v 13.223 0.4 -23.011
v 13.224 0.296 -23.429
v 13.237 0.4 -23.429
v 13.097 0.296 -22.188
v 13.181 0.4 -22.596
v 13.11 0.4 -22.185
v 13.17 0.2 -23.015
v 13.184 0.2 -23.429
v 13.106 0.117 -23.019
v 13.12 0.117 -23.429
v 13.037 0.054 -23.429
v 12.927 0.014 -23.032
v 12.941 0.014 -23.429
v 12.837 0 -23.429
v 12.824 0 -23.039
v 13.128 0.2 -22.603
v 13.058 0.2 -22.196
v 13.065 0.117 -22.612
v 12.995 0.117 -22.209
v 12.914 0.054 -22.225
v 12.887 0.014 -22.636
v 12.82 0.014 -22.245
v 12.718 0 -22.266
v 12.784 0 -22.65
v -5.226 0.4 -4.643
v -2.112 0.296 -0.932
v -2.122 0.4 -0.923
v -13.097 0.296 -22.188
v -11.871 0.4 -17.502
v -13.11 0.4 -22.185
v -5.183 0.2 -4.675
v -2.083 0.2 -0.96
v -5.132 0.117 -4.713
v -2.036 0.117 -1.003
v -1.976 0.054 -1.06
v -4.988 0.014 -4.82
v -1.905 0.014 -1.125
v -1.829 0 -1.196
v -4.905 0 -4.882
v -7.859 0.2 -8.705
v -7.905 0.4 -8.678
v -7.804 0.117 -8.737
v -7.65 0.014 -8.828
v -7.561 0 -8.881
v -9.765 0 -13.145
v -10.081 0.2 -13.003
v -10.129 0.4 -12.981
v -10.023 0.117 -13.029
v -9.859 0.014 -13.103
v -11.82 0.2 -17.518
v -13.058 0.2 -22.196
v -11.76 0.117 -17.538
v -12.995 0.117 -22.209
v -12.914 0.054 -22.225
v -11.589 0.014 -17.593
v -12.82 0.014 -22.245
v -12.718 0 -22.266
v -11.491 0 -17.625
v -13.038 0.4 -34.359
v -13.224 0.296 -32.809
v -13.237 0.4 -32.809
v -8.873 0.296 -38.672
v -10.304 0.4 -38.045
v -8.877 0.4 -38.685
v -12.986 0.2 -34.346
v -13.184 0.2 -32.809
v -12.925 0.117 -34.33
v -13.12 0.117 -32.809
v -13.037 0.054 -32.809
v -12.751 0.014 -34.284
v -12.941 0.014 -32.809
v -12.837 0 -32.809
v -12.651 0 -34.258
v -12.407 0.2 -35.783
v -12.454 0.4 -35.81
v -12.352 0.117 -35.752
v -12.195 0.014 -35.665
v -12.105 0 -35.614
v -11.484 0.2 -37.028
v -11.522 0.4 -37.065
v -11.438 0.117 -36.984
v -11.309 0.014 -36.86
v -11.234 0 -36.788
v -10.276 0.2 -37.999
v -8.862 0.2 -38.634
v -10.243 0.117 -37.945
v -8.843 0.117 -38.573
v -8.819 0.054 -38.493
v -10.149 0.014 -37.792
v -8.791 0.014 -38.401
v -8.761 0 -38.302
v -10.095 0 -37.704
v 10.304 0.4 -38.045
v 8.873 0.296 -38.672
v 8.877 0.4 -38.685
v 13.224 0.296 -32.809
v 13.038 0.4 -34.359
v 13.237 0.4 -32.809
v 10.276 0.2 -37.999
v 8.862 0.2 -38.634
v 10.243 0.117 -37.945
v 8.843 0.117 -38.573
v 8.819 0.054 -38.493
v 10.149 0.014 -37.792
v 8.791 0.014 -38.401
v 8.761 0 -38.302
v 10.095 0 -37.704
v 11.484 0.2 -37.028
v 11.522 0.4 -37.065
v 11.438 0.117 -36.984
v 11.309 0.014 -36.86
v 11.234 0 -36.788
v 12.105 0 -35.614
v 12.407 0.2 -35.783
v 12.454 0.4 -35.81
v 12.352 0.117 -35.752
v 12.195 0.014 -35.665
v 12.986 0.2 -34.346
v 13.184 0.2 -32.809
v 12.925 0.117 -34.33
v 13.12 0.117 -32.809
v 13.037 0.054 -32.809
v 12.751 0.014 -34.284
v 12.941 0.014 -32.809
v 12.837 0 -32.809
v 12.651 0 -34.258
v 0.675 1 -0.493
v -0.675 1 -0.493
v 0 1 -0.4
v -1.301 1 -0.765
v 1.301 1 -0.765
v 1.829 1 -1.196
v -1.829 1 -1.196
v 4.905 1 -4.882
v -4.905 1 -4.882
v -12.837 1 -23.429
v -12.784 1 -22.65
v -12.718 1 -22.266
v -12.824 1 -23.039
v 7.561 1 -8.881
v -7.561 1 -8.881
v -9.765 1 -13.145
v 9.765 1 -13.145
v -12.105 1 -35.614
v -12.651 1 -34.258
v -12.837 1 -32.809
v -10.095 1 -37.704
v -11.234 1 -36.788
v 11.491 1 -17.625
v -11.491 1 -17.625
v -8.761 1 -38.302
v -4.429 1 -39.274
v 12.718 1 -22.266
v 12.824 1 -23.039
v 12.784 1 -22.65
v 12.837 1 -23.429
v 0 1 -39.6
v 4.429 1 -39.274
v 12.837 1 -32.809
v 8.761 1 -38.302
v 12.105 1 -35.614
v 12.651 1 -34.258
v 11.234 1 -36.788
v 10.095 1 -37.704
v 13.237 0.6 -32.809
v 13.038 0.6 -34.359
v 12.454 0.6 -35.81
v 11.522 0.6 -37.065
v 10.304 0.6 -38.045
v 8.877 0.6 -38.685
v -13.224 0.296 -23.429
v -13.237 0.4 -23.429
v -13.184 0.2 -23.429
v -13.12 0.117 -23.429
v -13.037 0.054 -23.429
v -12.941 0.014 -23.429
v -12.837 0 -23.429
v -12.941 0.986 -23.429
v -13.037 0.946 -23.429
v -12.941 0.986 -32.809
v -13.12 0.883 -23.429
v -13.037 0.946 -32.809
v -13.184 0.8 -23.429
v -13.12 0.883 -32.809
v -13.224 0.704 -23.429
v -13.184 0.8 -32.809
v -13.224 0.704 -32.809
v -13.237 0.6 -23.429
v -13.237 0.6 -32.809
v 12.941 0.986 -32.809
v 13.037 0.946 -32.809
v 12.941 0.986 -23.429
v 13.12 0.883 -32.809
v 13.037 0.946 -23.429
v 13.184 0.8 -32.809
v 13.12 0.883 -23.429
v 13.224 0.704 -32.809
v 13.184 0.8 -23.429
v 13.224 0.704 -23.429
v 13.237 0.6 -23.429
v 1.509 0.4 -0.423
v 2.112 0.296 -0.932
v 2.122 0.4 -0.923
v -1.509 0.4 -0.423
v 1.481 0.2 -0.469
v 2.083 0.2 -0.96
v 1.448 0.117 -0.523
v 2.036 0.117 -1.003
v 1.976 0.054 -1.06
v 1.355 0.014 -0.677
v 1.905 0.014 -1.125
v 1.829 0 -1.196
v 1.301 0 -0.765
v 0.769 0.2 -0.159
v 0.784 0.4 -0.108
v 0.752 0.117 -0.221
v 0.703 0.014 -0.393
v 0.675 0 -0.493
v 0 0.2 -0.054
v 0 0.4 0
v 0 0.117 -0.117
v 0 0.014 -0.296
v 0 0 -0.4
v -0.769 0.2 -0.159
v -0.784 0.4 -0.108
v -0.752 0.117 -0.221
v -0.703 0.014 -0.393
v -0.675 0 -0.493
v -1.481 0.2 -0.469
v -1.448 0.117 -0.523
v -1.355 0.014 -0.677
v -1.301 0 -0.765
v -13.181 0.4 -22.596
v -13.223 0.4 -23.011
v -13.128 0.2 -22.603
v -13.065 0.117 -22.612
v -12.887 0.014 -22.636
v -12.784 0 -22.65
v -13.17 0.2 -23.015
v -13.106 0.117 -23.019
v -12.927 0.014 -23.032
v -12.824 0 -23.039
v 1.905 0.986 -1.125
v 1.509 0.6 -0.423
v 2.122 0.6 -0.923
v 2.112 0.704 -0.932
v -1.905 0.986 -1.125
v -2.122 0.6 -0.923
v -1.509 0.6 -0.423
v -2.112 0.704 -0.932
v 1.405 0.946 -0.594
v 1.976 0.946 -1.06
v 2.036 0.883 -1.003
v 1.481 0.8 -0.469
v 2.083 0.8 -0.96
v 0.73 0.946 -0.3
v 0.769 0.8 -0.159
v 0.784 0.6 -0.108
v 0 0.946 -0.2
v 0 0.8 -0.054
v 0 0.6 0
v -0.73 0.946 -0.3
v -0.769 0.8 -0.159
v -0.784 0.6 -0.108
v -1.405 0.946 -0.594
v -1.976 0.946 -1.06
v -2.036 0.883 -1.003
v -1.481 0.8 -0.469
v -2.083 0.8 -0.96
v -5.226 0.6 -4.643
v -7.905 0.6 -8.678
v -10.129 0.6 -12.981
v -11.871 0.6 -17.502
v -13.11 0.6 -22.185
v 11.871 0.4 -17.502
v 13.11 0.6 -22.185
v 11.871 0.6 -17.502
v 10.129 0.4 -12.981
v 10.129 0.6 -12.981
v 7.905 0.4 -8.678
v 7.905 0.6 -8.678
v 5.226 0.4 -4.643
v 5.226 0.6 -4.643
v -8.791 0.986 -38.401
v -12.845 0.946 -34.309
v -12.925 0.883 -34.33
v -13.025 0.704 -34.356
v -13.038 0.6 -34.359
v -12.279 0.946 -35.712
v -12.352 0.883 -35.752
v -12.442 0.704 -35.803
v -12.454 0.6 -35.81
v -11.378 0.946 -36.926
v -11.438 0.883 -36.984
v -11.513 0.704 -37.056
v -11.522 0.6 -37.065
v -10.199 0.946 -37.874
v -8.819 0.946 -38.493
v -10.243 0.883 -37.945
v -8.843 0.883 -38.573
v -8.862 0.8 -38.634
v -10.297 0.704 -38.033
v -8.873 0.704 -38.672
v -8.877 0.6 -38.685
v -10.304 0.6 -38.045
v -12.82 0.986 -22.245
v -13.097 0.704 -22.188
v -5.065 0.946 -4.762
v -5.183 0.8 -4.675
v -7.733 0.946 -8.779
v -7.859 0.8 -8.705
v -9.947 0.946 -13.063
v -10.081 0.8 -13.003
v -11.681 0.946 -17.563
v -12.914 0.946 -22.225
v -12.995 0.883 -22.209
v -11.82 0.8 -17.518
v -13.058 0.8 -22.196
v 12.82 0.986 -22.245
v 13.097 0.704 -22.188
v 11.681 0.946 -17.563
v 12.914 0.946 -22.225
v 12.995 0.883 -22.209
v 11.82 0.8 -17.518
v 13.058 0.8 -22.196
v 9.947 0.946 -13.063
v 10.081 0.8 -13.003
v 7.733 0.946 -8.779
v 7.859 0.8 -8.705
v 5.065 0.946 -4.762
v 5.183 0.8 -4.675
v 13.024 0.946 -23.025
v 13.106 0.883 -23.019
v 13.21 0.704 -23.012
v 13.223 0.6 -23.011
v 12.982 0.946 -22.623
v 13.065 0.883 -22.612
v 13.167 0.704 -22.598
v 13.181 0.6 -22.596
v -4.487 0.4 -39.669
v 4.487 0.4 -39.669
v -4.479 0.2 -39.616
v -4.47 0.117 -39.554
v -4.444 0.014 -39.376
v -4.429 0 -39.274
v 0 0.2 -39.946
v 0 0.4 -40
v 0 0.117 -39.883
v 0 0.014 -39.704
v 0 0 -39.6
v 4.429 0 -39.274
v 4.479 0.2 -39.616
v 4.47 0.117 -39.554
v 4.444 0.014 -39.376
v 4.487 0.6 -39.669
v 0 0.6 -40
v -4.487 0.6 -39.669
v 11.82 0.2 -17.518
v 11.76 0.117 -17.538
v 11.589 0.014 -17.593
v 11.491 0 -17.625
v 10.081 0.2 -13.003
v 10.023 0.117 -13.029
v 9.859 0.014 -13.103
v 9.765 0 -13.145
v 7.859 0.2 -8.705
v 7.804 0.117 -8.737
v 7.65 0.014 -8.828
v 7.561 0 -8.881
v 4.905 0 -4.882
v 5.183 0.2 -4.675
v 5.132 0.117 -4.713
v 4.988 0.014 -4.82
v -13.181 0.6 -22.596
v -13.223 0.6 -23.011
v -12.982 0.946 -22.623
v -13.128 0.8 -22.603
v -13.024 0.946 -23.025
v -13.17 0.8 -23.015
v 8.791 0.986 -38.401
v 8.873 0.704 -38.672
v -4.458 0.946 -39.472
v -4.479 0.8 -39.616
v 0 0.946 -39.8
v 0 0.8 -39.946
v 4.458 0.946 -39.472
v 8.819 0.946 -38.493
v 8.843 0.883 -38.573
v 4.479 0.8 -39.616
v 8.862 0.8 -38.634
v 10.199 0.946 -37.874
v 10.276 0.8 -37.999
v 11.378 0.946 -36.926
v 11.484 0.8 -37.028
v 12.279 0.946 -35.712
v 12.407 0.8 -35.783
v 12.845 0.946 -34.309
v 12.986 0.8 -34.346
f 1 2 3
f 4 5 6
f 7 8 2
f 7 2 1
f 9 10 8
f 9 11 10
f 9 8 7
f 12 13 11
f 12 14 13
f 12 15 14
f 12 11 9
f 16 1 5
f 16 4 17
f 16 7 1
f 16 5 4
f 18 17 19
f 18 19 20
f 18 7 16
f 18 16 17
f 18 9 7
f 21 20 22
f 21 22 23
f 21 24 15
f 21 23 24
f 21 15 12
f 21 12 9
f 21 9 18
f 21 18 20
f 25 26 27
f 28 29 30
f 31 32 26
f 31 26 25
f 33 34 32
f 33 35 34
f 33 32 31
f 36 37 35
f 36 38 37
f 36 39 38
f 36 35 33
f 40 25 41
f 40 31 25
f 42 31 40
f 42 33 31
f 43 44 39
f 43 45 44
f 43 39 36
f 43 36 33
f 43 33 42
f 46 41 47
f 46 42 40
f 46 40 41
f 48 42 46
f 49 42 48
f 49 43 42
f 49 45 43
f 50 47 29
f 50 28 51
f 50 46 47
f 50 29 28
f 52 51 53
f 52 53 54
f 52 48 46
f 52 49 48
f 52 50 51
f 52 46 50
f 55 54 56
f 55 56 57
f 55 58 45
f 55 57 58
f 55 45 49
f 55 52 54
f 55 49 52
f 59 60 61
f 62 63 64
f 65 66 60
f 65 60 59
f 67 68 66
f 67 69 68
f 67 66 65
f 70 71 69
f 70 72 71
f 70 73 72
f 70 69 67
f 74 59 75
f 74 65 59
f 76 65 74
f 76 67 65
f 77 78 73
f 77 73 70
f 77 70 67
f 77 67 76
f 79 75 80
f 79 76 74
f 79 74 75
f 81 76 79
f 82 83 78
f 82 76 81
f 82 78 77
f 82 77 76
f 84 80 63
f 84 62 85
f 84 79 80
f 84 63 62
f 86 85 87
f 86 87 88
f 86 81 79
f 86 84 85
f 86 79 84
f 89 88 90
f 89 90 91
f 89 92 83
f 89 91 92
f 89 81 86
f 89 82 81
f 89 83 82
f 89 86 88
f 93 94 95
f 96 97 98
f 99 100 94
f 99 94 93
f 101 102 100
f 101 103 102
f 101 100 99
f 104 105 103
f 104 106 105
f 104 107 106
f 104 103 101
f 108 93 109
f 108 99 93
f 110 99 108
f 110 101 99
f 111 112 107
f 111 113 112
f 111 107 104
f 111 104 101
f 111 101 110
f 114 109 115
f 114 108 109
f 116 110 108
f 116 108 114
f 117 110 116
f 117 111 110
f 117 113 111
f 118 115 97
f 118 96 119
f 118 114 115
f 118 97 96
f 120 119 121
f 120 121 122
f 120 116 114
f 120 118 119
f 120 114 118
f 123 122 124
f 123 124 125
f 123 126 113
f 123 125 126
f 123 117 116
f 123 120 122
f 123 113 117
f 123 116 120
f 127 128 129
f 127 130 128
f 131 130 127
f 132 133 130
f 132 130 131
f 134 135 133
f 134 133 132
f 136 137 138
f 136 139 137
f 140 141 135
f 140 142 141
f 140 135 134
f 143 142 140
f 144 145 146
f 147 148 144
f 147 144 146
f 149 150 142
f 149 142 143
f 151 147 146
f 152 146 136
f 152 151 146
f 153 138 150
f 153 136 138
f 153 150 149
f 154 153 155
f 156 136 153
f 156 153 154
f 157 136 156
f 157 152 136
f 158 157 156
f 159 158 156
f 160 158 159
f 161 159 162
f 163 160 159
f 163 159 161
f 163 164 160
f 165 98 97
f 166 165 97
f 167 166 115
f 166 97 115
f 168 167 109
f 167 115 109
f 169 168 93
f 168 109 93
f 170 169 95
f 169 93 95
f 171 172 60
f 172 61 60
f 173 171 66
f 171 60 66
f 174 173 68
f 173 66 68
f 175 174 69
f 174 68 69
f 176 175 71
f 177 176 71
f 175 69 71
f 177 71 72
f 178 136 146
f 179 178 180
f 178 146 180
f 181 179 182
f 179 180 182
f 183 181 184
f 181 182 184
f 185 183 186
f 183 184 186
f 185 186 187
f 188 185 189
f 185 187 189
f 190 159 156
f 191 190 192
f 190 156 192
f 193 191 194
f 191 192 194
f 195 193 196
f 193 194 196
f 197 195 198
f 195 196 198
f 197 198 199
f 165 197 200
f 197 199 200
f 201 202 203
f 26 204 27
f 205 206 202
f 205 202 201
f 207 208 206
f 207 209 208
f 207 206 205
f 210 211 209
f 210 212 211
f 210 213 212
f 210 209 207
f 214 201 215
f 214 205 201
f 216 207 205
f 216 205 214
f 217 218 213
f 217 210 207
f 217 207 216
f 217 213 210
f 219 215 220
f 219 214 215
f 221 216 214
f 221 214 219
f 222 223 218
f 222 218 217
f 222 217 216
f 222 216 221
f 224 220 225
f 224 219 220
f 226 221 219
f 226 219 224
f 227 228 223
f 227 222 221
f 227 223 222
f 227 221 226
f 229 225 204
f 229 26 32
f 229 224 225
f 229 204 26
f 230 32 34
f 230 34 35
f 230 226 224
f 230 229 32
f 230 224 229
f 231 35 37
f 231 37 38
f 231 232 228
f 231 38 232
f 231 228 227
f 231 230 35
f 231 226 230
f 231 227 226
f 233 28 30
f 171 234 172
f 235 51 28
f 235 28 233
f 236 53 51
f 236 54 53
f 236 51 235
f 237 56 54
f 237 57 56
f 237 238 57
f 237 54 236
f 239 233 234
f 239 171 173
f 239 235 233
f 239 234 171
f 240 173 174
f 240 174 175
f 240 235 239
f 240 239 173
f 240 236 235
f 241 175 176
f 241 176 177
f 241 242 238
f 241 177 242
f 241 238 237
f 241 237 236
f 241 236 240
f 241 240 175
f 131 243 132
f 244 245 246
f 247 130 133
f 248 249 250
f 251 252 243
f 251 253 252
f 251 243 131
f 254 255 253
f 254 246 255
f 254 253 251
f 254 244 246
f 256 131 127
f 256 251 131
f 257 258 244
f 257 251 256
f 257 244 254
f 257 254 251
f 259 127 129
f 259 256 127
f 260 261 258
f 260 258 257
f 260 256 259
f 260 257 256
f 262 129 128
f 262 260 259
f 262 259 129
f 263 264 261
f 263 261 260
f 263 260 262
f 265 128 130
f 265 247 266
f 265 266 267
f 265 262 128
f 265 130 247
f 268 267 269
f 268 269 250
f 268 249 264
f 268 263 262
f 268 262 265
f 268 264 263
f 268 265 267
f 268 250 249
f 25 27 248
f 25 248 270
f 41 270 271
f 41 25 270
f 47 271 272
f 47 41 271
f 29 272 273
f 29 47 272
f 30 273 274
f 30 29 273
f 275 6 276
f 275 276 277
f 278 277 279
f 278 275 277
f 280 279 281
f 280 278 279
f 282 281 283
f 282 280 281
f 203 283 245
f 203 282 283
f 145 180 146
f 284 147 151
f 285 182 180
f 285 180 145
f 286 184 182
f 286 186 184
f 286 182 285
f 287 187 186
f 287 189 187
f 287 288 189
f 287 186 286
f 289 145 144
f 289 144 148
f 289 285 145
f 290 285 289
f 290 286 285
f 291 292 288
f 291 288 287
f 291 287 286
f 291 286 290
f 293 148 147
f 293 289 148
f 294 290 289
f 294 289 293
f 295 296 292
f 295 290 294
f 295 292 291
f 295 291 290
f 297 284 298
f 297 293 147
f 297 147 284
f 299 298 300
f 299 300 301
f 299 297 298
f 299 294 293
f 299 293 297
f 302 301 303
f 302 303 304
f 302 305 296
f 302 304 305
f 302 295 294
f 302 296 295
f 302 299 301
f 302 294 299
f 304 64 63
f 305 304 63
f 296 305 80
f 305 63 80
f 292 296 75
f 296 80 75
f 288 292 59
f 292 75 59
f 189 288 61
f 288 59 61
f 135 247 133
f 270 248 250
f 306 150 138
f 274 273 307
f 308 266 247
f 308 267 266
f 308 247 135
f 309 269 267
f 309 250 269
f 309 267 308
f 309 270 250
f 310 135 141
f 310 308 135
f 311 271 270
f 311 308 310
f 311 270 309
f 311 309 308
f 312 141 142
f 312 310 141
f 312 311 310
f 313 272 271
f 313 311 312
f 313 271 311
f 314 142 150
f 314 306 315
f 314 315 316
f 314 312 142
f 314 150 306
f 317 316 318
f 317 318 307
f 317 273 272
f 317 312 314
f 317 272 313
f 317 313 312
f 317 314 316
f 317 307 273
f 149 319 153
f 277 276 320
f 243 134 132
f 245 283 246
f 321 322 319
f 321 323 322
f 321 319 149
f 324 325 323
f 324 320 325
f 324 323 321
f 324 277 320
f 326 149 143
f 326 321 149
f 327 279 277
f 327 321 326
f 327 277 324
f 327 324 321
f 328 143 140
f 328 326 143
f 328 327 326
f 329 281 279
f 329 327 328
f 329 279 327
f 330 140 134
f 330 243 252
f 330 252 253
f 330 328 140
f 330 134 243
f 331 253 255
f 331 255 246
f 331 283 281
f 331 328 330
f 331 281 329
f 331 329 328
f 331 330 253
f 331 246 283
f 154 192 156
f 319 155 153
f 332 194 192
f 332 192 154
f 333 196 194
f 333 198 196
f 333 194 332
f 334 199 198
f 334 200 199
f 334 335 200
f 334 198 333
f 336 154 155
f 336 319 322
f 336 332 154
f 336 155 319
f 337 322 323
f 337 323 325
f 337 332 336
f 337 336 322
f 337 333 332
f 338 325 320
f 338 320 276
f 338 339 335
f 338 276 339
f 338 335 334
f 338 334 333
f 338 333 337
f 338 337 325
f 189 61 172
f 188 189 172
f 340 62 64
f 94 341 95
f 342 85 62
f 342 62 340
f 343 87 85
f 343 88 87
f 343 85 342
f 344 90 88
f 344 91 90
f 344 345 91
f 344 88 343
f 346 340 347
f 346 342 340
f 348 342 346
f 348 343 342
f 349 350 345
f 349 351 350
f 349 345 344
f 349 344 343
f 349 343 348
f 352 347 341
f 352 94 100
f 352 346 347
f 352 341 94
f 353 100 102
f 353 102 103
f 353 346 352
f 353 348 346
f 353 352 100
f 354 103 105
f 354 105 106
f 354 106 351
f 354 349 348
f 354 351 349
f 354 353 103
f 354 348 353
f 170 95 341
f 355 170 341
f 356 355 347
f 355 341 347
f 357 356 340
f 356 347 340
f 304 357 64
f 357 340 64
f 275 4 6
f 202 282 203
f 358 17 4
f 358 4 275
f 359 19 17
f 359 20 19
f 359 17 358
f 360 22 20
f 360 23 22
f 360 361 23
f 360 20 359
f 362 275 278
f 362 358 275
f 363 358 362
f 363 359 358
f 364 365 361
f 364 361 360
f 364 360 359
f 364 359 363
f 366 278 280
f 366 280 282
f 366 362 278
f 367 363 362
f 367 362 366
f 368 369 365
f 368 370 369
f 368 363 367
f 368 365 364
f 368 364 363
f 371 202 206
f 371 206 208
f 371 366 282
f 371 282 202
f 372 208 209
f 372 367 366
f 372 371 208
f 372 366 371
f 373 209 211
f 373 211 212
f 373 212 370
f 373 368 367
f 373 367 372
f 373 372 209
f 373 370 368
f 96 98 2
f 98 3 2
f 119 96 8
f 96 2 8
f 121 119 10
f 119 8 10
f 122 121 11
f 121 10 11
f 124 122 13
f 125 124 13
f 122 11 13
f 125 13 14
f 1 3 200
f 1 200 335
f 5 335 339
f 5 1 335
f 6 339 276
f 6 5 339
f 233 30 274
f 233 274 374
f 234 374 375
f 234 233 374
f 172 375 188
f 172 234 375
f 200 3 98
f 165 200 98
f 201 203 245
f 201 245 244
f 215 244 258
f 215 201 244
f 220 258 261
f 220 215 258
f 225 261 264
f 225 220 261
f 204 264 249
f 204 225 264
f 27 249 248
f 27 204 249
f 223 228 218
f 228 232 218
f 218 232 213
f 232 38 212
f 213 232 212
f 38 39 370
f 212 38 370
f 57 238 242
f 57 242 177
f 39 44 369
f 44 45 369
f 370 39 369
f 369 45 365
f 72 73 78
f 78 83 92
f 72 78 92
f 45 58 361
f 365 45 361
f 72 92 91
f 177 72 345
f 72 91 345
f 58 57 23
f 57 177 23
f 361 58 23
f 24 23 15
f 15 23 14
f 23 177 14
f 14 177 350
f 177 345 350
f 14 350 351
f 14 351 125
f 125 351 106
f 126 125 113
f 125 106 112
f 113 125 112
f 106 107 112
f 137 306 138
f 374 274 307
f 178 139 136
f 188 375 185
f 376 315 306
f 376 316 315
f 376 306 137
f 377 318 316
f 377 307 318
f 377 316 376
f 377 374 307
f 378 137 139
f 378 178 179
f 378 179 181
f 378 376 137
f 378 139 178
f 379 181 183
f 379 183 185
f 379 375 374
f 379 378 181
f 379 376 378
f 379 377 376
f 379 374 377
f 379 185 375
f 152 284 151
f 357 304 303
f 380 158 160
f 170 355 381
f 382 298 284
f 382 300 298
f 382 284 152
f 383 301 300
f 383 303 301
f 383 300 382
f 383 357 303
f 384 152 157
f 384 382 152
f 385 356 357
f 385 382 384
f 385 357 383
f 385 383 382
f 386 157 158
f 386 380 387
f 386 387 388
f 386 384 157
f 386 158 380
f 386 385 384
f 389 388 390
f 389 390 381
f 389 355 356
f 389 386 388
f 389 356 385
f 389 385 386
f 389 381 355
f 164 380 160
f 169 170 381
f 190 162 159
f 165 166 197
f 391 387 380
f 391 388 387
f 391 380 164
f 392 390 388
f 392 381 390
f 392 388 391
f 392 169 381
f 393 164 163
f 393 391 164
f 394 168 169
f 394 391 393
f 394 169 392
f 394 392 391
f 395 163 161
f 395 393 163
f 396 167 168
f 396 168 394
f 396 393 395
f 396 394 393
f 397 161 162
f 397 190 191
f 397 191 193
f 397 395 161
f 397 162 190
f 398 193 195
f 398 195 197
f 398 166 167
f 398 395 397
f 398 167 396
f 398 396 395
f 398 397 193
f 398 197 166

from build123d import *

# Parameters (mm, degrees)
BOSS_EXTRUDE1_DEPTH = 1
BOSS_EXTRUDE2_DEPTH = 1
FILLET1_R           = 0.4


with BuildPart() as part:
    # Sketch1 → Boss-Extrude1 (new body)
    with BuildSketch(Plane(origin=(0, 0, 0), x_dir=(1, 0, 0), z_dir=(0, 1, 0))):
        with BuildLine():
            ThreePointArc((-8.877423872, 29.304875795), (0, 30.62), (8.877423872, 29.304875795))
            ThreePointArc((8.877423872, 29.304875795), (12.375173273, 26.566048159), (13.11, 22.184786084))
            ThreePointArc((13.11, 22.184786084), (9.076207285, 10.799312083), (2.121856975, 0.92320386))
            ThreePointArc((2.121856975, 0.92320386), (0, 0), (-2.121856975, 0.92320386))
            ThreePointArc((-2.121856975, 0.92320386), (-9.076207285, 10.799312083), (-13.11, 22.184786084))
            ThreePointArc((-13.11, 22.184786084), (-12.375173273, 26.566048159), (-8.877423872, 29.304875795))
        make_face()
    extrude(amount=BOSS_EXTRUDE1_DEPTH)

    # Sketch2 → Boss-Extrude2 (add)
    with BuildSketch(Plane(origin=(0, 0, 0), x_dir=(1, 0, 0), z_dir=(0, 1, 0))):
        with BuildLine():
            Line((-13.23730034, 32.808587834), (-13.23730034, 23.428587834))
            Line((-13.23730034, 23.428587834), (13.23730034, 23.428587834))
            Line((13.23730034, 23.428587834), (13.23730034, 32.808587834))
            ThreePointArc((13.23730034, 32.808587834), (12.02830219, 36.467114963), (8.877423872, 38.684875795))
            ThreePointArc((8.877423872, 38.684875795), (0, 40), (-8.877423872, 38.684875795))
            ThreePointArc((-8.877423872, 38.684875795), (-12.02830219, 36.467114963), (-13.23730034, 32.808587834))
        make_face()
    extrude(amount=BOSS_EXTRUDE2_DEPTH)

    # Fillet1
    fillet1_edges = [part.edges().sort_by_distance(p)[0] for p in [
        (0, 1, 0),
        (9.076207285, 1, -10.799312083),
        (-13.205392346, 0, -22.803438218),
        (-13.205392346, 1, -22.803438218),
        (13.205392346, 1, -22.803438218),
        (-12.02830219, 0, -36.467114963),
        (-13.23730034, 0, -28.118587834),
        (13.23730034, 1, -28.118587834),
        (12.02830219, 0, -36.467114963),
        (0, 1, -40),
        (12.02830219, 1, -36.467114963),
        (-12.02830219, 1, -36.467114963),
        (-13.23730034, 1, -28.118587834),
        (0, 0, -40),
        (13.23730034, 0, -28.118587834),
        (13.205392346, 0, -22.803438218),
        (9.076207285, 0, -10.799312083),
        (0, 0, 0),
        (-9.076207285, 0, -10.799312083),
        (-9.076207285, 1, -10.799312083),
    ]]
    fillet(fillet1_edges, radius=FILLET1_R)


solid = part.part
